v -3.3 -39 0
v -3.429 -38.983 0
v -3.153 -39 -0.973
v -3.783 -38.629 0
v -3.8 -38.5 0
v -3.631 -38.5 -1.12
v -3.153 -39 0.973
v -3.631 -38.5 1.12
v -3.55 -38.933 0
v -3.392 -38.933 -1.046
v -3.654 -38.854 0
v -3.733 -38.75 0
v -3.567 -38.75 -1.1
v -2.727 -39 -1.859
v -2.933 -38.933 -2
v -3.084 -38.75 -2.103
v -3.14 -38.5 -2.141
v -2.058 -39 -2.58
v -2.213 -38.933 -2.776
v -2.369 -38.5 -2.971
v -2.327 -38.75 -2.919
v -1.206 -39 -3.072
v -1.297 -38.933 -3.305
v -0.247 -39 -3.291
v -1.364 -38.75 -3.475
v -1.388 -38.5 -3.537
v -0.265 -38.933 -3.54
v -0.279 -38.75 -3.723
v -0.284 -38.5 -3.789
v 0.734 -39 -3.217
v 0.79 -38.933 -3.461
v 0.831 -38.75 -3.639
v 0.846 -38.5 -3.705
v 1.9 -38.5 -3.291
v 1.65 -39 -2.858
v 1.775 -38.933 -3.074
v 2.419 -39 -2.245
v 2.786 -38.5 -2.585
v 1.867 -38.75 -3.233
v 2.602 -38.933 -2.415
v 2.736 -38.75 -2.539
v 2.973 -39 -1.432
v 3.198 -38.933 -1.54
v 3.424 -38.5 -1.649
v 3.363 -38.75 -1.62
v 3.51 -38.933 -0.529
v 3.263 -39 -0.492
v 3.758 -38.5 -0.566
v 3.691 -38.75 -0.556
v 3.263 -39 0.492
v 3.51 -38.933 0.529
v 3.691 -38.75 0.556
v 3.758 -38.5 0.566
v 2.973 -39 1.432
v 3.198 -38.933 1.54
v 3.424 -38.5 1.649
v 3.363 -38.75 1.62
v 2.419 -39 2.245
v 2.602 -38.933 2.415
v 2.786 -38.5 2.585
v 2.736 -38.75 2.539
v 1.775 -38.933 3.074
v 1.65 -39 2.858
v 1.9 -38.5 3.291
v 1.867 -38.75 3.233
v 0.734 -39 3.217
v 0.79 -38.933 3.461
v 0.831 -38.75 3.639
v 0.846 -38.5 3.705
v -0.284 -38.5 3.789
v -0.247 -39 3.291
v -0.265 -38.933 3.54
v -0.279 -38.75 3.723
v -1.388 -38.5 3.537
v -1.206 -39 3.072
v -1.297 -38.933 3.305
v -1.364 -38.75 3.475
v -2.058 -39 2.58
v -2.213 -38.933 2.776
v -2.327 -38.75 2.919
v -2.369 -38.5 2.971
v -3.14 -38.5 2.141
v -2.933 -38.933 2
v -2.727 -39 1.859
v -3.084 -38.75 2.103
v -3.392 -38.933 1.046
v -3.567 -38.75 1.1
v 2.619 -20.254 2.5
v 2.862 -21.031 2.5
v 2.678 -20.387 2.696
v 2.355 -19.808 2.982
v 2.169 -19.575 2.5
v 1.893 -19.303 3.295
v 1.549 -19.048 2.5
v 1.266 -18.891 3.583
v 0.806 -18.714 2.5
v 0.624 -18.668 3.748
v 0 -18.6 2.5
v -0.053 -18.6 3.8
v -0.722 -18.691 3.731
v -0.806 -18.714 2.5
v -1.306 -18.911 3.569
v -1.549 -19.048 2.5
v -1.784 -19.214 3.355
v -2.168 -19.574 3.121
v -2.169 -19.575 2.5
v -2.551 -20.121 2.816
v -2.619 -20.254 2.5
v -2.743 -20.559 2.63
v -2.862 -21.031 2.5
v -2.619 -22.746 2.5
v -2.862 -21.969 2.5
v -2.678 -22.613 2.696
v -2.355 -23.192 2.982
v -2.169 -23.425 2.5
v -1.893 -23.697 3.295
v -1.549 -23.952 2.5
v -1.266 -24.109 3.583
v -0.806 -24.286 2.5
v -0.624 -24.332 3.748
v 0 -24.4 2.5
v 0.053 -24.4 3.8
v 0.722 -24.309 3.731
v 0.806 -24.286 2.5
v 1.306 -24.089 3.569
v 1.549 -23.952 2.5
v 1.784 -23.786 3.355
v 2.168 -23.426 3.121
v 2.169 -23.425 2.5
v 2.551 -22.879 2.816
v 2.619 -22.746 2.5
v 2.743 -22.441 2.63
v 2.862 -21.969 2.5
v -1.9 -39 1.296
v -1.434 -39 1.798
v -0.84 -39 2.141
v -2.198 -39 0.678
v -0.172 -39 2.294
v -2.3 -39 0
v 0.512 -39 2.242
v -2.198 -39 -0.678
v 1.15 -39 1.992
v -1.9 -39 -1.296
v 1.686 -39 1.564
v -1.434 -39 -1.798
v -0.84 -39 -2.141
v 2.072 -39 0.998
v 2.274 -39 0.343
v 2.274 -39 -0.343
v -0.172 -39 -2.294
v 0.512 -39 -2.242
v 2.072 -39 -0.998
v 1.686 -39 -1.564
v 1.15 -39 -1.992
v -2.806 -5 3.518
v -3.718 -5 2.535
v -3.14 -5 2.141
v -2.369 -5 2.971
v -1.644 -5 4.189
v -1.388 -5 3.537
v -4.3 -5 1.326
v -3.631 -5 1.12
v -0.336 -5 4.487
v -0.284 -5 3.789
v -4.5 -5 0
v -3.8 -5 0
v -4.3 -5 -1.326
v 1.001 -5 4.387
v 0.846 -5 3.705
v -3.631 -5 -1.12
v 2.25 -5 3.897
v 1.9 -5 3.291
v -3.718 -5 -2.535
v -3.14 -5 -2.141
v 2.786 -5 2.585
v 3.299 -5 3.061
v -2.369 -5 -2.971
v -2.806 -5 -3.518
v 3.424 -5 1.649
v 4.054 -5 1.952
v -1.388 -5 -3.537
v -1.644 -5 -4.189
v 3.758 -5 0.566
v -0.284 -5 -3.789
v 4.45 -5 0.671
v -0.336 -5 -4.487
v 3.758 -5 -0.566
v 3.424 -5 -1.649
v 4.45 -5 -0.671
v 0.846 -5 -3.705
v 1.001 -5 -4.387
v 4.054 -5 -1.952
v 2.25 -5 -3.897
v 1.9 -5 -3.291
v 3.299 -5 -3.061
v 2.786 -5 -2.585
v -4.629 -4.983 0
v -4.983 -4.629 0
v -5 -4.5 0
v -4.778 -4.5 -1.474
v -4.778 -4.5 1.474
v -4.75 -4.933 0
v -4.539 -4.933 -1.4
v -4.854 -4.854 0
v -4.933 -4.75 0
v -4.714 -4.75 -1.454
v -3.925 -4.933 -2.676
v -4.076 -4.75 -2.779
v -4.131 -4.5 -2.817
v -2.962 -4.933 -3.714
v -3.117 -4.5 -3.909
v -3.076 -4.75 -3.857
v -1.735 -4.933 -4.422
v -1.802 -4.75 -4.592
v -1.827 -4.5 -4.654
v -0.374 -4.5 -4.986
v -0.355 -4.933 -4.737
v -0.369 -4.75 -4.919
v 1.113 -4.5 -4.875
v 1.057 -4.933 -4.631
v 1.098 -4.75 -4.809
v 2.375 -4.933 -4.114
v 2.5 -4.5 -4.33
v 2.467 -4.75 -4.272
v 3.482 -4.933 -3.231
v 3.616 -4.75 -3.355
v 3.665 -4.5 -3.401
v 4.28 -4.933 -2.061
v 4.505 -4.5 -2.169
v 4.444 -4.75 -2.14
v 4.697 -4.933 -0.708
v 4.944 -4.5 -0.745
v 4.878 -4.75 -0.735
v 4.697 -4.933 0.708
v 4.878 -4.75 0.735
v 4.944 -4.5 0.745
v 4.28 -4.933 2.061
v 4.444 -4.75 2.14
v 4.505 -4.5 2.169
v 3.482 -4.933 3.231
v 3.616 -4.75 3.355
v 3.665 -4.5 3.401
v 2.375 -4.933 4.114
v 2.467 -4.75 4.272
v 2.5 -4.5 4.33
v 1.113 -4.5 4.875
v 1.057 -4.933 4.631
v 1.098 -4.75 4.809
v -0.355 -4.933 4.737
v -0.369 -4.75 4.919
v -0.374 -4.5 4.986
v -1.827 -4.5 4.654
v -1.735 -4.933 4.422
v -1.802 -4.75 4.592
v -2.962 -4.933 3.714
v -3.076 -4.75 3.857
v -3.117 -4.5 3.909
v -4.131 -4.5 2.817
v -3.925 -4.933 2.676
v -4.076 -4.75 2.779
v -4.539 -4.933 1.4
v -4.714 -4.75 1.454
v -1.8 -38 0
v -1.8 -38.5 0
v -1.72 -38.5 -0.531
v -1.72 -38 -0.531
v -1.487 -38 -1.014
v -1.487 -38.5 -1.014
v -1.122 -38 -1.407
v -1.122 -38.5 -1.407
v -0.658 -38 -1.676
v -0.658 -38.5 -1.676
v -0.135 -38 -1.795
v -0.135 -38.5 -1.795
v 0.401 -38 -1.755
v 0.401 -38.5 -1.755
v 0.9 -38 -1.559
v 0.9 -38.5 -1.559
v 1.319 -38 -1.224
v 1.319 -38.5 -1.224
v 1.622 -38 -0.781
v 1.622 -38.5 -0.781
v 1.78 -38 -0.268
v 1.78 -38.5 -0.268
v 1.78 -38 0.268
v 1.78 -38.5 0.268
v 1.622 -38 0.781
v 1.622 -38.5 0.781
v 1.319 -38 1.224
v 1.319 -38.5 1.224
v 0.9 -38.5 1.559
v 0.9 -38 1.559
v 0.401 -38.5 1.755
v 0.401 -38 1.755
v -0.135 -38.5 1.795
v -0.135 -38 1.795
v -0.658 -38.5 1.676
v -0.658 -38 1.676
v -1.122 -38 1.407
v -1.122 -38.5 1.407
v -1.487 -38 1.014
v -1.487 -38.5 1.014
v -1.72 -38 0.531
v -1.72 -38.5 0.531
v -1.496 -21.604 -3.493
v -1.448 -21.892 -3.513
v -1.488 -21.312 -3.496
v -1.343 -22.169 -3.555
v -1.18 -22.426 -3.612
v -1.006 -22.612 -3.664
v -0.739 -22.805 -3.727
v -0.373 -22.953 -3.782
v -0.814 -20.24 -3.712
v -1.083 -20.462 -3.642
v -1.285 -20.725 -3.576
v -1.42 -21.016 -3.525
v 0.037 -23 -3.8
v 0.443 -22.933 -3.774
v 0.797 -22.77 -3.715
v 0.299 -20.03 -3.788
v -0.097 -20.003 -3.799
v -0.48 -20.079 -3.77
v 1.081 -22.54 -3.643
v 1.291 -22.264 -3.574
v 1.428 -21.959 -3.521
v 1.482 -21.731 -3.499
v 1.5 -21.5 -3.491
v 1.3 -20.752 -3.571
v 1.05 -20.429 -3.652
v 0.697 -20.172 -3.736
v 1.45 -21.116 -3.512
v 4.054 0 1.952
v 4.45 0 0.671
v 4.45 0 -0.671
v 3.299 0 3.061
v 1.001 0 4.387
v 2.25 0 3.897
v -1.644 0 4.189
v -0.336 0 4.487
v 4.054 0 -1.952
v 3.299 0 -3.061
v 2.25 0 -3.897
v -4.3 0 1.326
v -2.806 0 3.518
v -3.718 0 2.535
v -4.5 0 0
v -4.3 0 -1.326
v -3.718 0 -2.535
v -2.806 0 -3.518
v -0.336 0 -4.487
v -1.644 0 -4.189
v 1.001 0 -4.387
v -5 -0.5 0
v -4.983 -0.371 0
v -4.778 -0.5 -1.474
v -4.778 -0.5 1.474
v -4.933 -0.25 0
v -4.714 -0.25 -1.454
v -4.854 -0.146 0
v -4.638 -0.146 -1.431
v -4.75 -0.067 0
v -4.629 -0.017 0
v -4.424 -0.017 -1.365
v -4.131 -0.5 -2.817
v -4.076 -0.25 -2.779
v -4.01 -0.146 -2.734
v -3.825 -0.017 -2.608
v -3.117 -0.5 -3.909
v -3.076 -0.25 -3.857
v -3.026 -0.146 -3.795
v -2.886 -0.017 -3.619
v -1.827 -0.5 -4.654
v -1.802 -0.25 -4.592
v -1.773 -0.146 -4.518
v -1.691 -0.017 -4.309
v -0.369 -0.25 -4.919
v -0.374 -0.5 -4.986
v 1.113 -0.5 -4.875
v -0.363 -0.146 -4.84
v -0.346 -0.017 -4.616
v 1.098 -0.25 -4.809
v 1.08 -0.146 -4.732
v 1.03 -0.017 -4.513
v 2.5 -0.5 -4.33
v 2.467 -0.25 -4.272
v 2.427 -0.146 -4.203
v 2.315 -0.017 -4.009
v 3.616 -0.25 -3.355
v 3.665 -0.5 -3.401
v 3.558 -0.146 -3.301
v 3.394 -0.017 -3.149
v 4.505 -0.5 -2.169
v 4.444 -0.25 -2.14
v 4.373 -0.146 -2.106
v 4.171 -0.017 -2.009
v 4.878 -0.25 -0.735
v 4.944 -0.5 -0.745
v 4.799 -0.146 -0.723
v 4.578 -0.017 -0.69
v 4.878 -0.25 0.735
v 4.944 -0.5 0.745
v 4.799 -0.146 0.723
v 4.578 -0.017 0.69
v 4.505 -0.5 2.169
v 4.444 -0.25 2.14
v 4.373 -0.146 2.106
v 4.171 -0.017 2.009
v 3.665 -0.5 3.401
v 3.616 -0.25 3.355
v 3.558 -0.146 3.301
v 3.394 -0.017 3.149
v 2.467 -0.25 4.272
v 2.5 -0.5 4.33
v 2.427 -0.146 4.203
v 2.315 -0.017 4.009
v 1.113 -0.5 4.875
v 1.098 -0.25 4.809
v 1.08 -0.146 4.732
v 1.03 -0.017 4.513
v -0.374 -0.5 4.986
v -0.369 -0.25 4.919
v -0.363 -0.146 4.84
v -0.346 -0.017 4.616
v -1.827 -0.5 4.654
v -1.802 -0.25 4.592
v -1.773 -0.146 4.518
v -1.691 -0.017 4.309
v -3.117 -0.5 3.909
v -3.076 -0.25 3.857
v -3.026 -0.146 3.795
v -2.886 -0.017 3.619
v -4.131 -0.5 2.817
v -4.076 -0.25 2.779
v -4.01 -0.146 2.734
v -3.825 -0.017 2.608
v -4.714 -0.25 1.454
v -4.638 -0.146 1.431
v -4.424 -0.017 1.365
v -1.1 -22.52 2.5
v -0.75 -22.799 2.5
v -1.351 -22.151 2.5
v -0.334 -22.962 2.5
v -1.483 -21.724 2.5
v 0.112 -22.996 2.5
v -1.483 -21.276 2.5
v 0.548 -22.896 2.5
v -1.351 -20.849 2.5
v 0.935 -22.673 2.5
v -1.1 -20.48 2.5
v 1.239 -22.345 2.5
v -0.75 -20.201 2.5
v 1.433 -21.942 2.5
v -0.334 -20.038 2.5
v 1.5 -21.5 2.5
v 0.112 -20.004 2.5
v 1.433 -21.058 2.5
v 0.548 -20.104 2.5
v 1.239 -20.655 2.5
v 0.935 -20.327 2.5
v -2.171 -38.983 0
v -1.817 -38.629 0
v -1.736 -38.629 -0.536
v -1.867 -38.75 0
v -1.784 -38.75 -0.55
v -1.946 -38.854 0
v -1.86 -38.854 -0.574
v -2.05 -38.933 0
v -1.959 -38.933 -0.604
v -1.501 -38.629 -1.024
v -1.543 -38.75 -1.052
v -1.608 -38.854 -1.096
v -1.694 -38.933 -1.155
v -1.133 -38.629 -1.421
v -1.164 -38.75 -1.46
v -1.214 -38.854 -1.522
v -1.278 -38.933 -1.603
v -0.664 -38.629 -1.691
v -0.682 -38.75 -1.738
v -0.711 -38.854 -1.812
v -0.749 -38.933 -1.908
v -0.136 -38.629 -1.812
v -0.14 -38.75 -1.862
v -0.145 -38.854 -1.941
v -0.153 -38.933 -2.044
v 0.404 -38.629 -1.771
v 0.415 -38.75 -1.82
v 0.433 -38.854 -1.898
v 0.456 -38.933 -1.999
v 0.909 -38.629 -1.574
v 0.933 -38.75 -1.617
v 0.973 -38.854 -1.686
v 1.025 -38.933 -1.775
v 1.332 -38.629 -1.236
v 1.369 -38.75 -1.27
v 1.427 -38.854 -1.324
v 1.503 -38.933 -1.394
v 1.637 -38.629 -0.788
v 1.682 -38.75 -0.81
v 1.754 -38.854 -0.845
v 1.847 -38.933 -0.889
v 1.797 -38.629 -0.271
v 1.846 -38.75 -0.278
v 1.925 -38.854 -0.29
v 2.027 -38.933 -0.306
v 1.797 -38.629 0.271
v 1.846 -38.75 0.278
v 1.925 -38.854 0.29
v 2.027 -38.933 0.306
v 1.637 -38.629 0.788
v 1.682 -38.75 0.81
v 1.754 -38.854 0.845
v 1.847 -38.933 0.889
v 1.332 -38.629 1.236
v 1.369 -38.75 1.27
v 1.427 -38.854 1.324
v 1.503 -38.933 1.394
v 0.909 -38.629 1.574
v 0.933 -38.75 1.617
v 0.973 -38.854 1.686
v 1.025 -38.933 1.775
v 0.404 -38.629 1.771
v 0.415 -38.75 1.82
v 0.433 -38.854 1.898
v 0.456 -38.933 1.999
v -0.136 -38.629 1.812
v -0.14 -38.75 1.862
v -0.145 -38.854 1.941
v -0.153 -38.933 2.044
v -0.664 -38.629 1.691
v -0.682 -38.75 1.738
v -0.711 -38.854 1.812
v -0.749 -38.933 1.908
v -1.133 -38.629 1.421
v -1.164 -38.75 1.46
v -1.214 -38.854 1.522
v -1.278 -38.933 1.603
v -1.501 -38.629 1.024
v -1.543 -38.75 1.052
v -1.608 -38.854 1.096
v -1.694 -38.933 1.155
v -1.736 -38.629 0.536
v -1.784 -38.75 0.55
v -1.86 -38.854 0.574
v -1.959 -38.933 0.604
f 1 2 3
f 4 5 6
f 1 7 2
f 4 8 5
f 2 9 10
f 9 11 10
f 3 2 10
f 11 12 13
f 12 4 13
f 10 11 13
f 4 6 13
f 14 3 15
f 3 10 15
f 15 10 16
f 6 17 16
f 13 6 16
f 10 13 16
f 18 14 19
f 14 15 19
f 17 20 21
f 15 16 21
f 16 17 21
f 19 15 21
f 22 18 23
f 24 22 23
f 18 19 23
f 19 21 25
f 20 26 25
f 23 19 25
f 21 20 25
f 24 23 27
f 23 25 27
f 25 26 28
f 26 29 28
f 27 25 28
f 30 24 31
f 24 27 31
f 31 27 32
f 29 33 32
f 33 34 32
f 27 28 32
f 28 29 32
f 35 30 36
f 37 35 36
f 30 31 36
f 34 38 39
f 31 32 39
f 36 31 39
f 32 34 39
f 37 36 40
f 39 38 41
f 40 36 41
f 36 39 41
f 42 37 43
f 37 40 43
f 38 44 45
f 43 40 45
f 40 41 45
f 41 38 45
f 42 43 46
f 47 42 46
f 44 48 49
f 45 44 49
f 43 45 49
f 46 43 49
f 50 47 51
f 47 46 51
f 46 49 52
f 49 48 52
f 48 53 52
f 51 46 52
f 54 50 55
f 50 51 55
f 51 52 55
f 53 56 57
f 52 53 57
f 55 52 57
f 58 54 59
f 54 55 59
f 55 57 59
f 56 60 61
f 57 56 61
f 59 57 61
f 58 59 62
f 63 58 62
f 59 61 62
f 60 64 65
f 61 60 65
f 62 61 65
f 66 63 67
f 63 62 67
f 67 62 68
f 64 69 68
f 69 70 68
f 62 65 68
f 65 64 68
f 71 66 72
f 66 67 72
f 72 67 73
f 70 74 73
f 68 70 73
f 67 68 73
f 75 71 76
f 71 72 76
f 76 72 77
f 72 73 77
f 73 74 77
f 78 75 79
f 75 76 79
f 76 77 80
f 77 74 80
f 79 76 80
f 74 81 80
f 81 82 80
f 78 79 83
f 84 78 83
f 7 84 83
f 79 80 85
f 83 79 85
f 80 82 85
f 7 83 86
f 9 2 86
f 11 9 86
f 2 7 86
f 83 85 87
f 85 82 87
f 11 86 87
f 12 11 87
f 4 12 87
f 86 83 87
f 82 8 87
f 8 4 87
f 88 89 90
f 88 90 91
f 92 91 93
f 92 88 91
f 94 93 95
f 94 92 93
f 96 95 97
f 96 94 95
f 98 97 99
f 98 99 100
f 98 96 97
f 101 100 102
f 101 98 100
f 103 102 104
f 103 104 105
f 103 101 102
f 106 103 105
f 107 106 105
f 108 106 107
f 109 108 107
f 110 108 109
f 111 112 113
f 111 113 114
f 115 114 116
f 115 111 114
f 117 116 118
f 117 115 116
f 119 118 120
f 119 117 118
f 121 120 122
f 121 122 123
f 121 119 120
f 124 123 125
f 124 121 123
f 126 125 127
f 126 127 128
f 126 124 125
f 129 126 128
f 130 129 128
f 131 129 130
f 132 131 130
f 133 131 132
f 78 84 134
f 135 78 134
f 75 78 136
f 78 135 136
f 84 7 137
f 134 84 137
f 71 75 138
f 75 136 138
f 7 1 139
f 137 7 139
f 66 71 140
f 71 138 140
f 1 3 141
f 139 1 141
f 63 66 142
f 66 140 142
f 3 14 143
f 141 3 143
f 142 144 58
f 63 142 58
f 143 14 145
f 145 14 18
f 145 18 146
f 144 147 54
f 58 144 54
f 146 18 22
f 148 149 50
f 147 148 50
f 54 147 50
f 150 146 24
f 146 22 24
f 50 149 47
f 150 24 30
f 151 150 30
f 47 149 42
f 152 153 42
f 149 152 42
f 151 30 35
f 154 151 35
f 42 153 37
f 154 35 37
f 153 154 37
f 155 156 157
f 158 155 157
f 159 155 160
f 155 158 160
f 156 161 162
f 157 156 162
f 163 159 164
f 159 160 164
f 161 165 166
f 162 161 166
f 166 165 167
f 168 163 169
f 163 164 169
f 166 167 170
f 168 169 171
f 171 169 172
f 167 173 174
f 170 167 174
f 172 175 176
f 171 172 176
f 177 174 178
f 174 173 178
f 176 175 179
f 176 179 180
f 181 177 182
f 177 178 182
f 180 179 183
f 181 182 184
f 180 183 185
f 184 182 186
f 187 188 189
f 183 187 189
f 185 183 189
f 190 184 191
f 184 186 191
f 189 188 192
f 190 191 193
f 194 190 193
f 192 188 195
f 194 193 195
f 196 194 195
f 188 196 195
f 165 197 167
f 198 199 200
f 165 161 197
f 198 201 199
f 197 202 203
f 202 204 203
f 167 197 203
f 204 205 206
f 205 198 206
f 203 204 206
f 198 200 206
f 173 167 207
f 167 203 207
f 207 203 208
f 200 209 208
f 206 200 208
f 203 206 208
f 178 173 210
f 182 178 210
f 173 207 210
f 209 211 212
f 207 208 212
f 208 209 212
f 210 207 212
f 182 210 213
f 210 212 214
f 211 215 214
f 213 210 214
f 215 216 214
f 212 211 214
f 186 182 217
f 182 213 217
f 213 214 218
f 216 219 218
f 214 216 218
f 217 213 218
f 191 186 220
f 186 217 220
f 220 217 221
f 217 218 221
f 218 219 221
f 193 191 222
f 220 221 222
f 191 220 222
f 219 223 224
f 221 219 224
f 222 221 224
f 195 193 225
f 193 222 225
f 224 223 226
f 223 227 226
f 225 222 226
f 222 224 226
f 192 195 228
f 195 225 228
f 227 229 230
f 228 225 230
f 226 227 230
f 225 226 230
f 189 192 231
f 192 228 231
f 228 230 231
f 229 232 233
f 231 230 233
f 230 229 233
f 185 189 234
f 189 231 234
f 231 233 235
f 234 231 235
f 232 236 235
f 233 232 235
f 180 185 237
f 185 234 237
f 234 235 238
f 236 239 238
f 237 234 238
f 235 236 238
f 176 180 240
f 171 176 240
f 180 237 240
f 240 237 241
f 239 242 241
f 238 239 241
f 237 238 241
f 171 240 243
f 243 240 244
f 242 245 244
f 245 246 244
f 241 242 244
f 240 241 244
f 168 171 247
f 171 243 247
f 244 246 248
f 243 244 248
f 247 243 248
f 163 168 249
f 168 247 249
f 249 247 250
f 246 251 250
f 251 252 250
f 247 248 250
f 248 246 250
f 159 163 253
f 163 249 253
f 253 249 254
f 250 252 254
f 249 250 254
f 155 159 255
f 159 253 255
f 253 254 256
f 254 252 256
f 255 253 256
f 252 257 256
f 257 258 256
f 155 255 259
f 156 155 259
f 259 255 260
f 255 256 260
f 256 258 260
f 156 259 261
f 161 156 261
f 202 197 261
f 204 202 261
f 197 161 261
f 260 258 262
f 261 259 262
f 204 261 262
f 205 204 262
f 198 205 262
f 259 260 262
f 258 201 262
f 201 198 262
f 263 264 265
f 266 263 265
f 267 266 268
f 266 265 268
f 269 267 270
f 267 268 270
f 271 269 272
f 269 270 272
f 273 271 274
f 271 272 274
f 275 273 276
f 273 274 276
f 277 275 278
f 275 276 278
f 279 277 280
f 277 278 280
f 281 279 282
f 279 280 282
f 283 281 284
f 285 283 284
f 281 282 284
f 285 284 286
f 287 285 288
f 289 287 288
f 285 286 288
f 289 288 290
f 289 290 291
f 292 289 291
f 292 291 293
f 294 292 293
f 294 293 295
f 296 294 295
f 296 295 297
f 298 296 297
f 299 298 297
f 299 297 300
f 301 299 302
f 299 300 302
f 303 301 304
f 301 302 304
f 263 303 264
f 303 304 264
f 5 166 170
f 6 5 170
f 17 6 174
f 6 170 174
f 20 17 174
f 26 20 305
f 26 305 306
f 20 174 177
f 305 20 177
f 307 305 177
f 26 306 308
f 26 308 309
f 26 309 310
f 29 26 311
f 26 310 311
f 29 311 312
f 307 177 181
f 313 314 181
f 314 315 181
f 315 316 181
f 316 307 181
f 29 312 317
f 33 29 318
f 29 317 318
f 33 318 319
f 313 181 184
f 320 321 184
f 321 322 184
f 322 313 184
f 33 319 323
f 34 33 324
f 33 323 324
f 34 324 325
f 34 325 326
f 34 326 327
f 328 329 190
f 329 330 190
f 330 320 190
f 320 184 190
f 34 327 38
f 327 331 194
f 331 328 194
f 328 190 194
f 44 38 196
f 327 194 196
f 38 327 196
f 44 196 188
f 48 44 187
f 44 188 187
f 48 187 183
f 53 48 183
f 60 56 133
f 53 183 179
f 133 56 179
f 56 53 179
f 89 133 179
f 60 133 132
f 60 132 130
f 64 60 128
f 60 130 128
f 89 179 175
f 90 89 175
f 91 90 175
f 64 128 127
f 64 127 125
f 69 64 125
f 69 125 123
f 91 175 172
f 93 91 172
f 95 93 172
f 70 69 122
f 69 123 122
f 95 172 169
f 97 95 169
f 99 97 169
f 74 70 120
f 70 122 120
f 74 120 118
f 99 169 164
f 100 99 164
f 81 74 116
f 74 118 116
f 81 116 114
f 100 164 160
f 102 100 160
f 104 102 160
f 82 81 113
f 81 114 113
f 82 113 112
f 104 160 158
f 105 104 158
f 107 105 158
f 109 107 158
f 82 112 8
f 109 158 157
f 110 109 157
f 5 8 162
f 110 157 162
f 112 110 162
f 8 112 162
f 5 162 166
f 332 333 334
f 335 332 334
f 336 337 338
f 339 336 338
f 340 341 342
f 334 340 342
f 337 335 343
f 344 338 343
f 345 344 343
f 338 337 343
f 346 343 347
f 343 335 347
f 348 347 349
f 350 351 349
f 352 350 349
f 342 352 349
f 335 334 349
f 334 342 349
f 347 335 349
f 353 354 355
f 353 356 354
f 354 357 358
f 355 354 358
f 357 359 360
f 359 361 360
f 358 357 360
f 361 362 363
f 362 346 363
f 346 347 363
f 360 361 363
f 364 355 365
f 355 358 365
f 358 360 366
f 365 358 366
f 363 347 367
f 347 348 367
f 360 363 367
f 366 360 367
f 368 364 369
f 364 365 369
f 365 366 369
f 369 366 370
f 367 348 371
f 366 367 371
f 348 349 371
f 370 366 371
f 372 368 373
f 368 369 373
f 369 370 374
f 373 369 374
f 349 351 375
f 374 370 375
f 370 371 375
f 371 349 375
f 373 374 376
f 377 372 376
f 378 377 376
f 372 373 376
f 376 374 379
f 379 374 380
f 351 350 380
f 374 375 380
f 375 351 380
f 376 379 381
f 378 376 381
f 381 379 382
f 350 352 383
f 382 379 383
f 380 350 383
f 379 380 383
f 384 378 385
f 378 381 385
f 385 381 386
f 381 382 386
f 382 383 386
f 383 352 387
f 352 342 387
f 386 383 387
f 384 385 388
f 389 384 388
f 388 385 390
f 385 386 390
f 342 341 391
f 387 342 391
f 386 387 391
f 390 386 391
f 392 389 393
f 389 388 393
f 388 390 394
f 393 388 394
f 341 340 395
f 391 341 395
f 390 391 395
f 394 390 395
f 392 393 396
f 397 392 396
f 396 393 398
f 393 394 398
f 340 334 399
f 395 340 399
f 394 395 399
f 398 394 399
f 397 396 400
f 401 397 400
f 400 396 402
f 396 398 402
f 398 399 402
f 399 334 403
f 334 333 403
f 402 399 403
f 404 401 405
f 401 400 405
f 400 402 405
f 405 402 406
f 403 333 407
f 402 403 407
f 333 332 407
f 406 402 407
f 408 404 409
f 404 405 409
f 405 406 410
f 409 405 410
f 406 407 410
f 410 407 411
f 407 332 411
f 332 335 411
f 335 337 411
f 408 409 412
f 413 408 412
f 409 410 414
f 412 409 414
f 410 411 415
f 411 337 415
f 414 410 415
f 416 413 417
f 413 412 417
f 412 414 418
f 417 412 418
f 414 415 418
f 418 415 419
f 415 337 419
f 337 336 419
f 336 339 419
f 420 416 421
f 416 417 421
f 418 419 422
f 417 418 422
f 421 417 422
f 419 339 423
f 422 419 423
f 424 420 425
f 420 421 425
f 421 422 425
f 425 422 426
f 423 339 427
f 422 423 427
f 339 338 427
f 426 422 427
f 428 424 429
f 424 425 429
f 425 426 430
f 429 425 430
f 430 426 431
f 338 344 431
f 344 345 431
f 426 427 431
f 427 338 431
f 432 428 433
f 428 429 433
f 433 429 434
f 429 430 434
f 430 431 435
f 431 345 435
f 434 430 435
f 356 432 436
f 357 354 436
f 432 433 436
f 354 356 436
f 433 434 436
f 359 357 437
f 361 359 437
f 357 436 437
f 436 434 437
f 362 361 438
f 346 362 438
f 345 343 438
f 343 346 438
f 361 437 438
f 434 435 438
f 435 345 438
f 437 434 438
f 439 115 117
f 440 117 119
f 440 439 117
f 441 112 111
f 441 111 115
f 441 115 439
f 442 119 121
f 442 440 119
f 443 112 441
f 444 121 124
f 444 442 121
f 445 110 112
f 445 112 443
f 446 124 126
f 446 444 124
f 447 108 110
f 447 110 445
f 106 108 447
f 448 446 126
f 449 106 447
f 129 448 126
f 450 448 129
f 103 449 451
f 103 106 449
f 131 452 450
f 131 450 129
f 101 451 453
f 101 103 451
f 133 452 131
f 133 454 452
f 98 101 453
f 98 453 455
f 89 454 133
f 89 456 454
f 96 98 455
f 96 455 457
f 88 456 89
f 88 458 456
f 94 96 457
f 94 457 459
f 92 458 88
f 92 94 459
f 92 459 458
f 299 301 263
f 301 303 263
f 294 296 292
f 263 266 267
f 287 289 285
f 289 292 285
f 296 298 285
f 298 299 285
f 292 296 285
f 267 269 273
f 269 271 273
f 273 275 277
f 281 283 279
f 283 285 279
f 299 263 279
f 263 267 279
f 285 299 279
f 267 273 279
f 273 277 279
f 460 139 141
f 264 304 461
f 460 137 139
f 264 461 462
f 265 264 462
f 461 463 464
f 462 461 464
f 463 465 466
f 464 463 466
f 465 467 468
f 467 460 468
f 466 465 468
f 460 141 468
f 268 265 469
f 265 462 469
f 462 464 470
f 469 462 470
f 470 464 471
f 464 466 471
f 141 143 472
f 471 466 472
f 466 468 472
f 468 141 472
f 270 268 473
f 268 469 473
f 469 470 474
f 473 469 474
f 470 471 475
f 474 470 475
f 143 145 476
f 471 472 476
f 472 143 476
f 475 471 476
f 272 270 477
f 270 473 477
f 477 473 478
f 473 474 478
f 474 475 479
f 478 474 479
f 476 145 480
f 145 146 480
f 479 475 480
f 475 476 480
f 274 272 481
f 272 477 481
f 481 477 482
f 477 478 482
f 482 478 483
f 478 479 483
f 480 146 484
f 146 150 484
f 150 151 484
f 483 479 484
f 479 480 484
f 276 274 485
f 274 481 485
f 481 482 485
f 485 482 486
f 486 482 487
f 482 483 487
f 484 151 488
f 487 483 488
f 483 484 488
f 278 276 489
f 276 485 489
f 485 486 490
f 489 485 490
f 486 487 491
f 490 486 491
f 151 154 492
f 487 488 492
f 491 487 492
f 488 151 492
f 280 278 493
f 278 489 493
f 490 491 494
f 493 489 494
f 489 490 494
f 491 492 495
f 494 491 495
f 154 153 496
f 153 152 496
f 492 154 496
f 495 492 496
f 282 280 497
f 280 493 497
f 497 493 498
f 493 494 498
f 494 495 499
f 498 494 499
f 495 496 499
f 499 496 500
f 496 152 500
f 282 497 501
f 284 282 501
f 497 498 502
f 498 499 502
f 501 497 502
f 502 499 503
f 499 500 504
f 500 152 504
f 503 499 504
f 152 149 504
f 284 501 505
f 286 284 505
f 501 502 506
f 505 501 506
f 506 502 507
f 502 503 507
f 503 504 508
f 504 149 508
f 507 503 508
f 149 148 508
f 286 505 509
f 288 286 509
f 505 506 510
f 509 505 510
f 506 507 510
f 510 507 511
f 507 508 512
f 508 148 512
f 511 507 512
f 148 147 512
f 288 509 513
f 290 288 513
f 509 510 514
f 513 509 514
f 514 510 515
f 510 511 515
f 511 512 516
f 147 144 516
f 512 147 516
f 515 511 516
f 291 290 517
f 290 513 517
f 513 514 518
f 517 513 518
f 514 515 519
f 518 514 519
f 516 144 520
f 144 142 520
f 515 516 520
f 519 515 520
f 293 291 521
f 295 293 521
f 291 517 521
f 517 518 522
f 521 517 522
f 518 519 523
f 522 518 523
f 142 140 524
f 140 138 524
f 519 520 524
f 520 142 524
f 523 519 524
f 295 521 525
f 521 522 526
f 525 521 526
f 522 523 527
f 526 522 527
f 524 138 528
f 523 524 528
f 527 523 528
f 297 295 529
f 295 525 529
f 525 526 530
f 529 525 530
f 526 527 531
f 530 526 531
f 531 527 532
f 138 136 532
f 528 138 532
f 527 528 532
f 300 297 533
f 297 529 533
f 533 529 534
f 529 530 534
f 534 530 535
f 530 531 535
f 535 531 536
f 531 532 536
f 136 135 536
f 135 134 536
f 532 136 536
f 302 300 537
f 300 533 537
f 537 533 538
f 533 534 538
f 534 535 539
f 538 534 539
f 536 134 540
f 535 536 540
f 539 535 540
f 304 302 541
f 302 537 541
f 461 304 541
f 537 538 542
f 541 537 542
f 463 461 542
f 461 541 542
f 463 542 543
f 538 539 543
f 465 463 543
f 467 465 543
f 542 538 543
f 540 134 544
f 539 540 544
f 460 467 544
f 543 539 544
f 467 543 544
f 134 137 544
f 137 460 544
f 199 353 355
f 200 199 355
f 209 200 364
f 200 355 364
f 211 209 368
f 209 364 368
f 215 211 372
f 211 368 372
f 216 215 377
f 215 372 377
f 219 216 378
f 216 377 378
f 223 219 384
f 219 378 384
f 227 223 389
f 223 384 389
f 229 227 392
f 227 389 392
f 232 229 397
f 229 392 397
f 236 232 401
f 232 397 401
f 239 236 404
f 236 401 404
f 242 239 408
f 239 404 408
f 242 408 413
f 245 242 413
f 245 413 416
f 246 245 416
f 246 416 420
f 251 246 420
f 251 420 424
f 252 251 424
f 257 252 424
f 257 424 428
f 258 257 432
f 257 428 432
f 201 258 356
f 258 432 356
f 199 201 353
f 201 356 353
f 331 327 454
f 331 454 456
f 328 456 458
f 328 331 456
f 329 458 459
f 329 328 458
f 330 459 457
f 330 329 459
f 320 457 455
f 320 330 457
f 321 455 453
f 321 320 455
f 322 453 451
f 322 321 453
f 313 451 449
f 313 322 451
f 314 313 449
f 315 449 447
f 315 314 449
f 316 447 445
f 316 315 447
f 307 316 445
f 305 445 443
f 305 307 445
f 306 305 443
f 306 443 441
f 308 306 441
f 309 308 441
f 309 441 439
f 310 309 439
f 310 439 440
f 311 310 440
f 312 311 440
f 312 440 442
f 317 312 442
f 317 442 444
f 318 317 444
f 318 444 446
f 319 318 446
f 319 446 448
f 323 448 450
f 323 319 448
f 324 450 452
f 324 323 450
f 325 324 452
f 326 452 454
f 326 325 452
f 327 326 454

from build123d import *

# Parameters (mm, degrees)
VERRUNDUNG1_R                        = 0.5
SCHNITT_LINEAR_AUSTRAGEN1_DEPTH      = 40.635842378
SCHNITT_LINEAR_AUSTRAGEN1_DEPTH_BACK = 40.635842378
SKIZZE2_R                            = 1.5
SKIZZE3_R                            = 2.9
SCHNITT_LINEAR_AUSTRAGEN10_DEPTH     = 41.028115132


with BuildPart() as part:
    # Skizze1 → Rotation1 (revolve)
    with BuildSketch(Plane.XY):
        Polygon((0, 0), (0, -38), (-1.8, -38), (-1.8, -39), (-3.8, -39), (-3.8, -5), (-5, -5), (-5, 0), align=None)
    revolve(axis=Axis((0, 0, 0), (0, -1, 0)))

    # Verrundung1
    verrundung1_edges = [part.edges().sort_by_distance(p)[0] for p in [
        (5, 0, 0),
        (5, -5, 0),
        (3.8, -39, 0),
        (1.8, -39, 0),
    ]]
    fillet(verrundung1_edges, radius=VERRUNDUNG1_R)

    # Skizze2 → Schnitt-Linear austragen1 (cut, two sides: drawn at the far end of the back side and taken through both)
    with BuildSketch(Plane.XY.offset(-SCHNITT_LINEAR_AUSTRAGEN1_DEPTH_BACK)):
        with Locations((0, -21.5)):
            Circle(SKIZZE2_R)
    extrude(amount=SCHNITT_LINEAR_AUSTRAGEN1_DEPTH + SCHNITT_LINEAR_AUSTRAGEN1_DEPTH_BACK, mode=Mode.SUBTRACT)

    # Skizze3 → Schnitt-Linear austragen10 (cut, through all)
    with BuildSketch(Plane.XY.offset(2.5)):
        with Locations((0, -21.5)):
            Circle(SKIZZE3_R)
    extrude(amount=SCHNITT_LINEAR_AUSTRAGEN10_DEPTH, mode=Mode.SUBTRACT)


solid = part.part
